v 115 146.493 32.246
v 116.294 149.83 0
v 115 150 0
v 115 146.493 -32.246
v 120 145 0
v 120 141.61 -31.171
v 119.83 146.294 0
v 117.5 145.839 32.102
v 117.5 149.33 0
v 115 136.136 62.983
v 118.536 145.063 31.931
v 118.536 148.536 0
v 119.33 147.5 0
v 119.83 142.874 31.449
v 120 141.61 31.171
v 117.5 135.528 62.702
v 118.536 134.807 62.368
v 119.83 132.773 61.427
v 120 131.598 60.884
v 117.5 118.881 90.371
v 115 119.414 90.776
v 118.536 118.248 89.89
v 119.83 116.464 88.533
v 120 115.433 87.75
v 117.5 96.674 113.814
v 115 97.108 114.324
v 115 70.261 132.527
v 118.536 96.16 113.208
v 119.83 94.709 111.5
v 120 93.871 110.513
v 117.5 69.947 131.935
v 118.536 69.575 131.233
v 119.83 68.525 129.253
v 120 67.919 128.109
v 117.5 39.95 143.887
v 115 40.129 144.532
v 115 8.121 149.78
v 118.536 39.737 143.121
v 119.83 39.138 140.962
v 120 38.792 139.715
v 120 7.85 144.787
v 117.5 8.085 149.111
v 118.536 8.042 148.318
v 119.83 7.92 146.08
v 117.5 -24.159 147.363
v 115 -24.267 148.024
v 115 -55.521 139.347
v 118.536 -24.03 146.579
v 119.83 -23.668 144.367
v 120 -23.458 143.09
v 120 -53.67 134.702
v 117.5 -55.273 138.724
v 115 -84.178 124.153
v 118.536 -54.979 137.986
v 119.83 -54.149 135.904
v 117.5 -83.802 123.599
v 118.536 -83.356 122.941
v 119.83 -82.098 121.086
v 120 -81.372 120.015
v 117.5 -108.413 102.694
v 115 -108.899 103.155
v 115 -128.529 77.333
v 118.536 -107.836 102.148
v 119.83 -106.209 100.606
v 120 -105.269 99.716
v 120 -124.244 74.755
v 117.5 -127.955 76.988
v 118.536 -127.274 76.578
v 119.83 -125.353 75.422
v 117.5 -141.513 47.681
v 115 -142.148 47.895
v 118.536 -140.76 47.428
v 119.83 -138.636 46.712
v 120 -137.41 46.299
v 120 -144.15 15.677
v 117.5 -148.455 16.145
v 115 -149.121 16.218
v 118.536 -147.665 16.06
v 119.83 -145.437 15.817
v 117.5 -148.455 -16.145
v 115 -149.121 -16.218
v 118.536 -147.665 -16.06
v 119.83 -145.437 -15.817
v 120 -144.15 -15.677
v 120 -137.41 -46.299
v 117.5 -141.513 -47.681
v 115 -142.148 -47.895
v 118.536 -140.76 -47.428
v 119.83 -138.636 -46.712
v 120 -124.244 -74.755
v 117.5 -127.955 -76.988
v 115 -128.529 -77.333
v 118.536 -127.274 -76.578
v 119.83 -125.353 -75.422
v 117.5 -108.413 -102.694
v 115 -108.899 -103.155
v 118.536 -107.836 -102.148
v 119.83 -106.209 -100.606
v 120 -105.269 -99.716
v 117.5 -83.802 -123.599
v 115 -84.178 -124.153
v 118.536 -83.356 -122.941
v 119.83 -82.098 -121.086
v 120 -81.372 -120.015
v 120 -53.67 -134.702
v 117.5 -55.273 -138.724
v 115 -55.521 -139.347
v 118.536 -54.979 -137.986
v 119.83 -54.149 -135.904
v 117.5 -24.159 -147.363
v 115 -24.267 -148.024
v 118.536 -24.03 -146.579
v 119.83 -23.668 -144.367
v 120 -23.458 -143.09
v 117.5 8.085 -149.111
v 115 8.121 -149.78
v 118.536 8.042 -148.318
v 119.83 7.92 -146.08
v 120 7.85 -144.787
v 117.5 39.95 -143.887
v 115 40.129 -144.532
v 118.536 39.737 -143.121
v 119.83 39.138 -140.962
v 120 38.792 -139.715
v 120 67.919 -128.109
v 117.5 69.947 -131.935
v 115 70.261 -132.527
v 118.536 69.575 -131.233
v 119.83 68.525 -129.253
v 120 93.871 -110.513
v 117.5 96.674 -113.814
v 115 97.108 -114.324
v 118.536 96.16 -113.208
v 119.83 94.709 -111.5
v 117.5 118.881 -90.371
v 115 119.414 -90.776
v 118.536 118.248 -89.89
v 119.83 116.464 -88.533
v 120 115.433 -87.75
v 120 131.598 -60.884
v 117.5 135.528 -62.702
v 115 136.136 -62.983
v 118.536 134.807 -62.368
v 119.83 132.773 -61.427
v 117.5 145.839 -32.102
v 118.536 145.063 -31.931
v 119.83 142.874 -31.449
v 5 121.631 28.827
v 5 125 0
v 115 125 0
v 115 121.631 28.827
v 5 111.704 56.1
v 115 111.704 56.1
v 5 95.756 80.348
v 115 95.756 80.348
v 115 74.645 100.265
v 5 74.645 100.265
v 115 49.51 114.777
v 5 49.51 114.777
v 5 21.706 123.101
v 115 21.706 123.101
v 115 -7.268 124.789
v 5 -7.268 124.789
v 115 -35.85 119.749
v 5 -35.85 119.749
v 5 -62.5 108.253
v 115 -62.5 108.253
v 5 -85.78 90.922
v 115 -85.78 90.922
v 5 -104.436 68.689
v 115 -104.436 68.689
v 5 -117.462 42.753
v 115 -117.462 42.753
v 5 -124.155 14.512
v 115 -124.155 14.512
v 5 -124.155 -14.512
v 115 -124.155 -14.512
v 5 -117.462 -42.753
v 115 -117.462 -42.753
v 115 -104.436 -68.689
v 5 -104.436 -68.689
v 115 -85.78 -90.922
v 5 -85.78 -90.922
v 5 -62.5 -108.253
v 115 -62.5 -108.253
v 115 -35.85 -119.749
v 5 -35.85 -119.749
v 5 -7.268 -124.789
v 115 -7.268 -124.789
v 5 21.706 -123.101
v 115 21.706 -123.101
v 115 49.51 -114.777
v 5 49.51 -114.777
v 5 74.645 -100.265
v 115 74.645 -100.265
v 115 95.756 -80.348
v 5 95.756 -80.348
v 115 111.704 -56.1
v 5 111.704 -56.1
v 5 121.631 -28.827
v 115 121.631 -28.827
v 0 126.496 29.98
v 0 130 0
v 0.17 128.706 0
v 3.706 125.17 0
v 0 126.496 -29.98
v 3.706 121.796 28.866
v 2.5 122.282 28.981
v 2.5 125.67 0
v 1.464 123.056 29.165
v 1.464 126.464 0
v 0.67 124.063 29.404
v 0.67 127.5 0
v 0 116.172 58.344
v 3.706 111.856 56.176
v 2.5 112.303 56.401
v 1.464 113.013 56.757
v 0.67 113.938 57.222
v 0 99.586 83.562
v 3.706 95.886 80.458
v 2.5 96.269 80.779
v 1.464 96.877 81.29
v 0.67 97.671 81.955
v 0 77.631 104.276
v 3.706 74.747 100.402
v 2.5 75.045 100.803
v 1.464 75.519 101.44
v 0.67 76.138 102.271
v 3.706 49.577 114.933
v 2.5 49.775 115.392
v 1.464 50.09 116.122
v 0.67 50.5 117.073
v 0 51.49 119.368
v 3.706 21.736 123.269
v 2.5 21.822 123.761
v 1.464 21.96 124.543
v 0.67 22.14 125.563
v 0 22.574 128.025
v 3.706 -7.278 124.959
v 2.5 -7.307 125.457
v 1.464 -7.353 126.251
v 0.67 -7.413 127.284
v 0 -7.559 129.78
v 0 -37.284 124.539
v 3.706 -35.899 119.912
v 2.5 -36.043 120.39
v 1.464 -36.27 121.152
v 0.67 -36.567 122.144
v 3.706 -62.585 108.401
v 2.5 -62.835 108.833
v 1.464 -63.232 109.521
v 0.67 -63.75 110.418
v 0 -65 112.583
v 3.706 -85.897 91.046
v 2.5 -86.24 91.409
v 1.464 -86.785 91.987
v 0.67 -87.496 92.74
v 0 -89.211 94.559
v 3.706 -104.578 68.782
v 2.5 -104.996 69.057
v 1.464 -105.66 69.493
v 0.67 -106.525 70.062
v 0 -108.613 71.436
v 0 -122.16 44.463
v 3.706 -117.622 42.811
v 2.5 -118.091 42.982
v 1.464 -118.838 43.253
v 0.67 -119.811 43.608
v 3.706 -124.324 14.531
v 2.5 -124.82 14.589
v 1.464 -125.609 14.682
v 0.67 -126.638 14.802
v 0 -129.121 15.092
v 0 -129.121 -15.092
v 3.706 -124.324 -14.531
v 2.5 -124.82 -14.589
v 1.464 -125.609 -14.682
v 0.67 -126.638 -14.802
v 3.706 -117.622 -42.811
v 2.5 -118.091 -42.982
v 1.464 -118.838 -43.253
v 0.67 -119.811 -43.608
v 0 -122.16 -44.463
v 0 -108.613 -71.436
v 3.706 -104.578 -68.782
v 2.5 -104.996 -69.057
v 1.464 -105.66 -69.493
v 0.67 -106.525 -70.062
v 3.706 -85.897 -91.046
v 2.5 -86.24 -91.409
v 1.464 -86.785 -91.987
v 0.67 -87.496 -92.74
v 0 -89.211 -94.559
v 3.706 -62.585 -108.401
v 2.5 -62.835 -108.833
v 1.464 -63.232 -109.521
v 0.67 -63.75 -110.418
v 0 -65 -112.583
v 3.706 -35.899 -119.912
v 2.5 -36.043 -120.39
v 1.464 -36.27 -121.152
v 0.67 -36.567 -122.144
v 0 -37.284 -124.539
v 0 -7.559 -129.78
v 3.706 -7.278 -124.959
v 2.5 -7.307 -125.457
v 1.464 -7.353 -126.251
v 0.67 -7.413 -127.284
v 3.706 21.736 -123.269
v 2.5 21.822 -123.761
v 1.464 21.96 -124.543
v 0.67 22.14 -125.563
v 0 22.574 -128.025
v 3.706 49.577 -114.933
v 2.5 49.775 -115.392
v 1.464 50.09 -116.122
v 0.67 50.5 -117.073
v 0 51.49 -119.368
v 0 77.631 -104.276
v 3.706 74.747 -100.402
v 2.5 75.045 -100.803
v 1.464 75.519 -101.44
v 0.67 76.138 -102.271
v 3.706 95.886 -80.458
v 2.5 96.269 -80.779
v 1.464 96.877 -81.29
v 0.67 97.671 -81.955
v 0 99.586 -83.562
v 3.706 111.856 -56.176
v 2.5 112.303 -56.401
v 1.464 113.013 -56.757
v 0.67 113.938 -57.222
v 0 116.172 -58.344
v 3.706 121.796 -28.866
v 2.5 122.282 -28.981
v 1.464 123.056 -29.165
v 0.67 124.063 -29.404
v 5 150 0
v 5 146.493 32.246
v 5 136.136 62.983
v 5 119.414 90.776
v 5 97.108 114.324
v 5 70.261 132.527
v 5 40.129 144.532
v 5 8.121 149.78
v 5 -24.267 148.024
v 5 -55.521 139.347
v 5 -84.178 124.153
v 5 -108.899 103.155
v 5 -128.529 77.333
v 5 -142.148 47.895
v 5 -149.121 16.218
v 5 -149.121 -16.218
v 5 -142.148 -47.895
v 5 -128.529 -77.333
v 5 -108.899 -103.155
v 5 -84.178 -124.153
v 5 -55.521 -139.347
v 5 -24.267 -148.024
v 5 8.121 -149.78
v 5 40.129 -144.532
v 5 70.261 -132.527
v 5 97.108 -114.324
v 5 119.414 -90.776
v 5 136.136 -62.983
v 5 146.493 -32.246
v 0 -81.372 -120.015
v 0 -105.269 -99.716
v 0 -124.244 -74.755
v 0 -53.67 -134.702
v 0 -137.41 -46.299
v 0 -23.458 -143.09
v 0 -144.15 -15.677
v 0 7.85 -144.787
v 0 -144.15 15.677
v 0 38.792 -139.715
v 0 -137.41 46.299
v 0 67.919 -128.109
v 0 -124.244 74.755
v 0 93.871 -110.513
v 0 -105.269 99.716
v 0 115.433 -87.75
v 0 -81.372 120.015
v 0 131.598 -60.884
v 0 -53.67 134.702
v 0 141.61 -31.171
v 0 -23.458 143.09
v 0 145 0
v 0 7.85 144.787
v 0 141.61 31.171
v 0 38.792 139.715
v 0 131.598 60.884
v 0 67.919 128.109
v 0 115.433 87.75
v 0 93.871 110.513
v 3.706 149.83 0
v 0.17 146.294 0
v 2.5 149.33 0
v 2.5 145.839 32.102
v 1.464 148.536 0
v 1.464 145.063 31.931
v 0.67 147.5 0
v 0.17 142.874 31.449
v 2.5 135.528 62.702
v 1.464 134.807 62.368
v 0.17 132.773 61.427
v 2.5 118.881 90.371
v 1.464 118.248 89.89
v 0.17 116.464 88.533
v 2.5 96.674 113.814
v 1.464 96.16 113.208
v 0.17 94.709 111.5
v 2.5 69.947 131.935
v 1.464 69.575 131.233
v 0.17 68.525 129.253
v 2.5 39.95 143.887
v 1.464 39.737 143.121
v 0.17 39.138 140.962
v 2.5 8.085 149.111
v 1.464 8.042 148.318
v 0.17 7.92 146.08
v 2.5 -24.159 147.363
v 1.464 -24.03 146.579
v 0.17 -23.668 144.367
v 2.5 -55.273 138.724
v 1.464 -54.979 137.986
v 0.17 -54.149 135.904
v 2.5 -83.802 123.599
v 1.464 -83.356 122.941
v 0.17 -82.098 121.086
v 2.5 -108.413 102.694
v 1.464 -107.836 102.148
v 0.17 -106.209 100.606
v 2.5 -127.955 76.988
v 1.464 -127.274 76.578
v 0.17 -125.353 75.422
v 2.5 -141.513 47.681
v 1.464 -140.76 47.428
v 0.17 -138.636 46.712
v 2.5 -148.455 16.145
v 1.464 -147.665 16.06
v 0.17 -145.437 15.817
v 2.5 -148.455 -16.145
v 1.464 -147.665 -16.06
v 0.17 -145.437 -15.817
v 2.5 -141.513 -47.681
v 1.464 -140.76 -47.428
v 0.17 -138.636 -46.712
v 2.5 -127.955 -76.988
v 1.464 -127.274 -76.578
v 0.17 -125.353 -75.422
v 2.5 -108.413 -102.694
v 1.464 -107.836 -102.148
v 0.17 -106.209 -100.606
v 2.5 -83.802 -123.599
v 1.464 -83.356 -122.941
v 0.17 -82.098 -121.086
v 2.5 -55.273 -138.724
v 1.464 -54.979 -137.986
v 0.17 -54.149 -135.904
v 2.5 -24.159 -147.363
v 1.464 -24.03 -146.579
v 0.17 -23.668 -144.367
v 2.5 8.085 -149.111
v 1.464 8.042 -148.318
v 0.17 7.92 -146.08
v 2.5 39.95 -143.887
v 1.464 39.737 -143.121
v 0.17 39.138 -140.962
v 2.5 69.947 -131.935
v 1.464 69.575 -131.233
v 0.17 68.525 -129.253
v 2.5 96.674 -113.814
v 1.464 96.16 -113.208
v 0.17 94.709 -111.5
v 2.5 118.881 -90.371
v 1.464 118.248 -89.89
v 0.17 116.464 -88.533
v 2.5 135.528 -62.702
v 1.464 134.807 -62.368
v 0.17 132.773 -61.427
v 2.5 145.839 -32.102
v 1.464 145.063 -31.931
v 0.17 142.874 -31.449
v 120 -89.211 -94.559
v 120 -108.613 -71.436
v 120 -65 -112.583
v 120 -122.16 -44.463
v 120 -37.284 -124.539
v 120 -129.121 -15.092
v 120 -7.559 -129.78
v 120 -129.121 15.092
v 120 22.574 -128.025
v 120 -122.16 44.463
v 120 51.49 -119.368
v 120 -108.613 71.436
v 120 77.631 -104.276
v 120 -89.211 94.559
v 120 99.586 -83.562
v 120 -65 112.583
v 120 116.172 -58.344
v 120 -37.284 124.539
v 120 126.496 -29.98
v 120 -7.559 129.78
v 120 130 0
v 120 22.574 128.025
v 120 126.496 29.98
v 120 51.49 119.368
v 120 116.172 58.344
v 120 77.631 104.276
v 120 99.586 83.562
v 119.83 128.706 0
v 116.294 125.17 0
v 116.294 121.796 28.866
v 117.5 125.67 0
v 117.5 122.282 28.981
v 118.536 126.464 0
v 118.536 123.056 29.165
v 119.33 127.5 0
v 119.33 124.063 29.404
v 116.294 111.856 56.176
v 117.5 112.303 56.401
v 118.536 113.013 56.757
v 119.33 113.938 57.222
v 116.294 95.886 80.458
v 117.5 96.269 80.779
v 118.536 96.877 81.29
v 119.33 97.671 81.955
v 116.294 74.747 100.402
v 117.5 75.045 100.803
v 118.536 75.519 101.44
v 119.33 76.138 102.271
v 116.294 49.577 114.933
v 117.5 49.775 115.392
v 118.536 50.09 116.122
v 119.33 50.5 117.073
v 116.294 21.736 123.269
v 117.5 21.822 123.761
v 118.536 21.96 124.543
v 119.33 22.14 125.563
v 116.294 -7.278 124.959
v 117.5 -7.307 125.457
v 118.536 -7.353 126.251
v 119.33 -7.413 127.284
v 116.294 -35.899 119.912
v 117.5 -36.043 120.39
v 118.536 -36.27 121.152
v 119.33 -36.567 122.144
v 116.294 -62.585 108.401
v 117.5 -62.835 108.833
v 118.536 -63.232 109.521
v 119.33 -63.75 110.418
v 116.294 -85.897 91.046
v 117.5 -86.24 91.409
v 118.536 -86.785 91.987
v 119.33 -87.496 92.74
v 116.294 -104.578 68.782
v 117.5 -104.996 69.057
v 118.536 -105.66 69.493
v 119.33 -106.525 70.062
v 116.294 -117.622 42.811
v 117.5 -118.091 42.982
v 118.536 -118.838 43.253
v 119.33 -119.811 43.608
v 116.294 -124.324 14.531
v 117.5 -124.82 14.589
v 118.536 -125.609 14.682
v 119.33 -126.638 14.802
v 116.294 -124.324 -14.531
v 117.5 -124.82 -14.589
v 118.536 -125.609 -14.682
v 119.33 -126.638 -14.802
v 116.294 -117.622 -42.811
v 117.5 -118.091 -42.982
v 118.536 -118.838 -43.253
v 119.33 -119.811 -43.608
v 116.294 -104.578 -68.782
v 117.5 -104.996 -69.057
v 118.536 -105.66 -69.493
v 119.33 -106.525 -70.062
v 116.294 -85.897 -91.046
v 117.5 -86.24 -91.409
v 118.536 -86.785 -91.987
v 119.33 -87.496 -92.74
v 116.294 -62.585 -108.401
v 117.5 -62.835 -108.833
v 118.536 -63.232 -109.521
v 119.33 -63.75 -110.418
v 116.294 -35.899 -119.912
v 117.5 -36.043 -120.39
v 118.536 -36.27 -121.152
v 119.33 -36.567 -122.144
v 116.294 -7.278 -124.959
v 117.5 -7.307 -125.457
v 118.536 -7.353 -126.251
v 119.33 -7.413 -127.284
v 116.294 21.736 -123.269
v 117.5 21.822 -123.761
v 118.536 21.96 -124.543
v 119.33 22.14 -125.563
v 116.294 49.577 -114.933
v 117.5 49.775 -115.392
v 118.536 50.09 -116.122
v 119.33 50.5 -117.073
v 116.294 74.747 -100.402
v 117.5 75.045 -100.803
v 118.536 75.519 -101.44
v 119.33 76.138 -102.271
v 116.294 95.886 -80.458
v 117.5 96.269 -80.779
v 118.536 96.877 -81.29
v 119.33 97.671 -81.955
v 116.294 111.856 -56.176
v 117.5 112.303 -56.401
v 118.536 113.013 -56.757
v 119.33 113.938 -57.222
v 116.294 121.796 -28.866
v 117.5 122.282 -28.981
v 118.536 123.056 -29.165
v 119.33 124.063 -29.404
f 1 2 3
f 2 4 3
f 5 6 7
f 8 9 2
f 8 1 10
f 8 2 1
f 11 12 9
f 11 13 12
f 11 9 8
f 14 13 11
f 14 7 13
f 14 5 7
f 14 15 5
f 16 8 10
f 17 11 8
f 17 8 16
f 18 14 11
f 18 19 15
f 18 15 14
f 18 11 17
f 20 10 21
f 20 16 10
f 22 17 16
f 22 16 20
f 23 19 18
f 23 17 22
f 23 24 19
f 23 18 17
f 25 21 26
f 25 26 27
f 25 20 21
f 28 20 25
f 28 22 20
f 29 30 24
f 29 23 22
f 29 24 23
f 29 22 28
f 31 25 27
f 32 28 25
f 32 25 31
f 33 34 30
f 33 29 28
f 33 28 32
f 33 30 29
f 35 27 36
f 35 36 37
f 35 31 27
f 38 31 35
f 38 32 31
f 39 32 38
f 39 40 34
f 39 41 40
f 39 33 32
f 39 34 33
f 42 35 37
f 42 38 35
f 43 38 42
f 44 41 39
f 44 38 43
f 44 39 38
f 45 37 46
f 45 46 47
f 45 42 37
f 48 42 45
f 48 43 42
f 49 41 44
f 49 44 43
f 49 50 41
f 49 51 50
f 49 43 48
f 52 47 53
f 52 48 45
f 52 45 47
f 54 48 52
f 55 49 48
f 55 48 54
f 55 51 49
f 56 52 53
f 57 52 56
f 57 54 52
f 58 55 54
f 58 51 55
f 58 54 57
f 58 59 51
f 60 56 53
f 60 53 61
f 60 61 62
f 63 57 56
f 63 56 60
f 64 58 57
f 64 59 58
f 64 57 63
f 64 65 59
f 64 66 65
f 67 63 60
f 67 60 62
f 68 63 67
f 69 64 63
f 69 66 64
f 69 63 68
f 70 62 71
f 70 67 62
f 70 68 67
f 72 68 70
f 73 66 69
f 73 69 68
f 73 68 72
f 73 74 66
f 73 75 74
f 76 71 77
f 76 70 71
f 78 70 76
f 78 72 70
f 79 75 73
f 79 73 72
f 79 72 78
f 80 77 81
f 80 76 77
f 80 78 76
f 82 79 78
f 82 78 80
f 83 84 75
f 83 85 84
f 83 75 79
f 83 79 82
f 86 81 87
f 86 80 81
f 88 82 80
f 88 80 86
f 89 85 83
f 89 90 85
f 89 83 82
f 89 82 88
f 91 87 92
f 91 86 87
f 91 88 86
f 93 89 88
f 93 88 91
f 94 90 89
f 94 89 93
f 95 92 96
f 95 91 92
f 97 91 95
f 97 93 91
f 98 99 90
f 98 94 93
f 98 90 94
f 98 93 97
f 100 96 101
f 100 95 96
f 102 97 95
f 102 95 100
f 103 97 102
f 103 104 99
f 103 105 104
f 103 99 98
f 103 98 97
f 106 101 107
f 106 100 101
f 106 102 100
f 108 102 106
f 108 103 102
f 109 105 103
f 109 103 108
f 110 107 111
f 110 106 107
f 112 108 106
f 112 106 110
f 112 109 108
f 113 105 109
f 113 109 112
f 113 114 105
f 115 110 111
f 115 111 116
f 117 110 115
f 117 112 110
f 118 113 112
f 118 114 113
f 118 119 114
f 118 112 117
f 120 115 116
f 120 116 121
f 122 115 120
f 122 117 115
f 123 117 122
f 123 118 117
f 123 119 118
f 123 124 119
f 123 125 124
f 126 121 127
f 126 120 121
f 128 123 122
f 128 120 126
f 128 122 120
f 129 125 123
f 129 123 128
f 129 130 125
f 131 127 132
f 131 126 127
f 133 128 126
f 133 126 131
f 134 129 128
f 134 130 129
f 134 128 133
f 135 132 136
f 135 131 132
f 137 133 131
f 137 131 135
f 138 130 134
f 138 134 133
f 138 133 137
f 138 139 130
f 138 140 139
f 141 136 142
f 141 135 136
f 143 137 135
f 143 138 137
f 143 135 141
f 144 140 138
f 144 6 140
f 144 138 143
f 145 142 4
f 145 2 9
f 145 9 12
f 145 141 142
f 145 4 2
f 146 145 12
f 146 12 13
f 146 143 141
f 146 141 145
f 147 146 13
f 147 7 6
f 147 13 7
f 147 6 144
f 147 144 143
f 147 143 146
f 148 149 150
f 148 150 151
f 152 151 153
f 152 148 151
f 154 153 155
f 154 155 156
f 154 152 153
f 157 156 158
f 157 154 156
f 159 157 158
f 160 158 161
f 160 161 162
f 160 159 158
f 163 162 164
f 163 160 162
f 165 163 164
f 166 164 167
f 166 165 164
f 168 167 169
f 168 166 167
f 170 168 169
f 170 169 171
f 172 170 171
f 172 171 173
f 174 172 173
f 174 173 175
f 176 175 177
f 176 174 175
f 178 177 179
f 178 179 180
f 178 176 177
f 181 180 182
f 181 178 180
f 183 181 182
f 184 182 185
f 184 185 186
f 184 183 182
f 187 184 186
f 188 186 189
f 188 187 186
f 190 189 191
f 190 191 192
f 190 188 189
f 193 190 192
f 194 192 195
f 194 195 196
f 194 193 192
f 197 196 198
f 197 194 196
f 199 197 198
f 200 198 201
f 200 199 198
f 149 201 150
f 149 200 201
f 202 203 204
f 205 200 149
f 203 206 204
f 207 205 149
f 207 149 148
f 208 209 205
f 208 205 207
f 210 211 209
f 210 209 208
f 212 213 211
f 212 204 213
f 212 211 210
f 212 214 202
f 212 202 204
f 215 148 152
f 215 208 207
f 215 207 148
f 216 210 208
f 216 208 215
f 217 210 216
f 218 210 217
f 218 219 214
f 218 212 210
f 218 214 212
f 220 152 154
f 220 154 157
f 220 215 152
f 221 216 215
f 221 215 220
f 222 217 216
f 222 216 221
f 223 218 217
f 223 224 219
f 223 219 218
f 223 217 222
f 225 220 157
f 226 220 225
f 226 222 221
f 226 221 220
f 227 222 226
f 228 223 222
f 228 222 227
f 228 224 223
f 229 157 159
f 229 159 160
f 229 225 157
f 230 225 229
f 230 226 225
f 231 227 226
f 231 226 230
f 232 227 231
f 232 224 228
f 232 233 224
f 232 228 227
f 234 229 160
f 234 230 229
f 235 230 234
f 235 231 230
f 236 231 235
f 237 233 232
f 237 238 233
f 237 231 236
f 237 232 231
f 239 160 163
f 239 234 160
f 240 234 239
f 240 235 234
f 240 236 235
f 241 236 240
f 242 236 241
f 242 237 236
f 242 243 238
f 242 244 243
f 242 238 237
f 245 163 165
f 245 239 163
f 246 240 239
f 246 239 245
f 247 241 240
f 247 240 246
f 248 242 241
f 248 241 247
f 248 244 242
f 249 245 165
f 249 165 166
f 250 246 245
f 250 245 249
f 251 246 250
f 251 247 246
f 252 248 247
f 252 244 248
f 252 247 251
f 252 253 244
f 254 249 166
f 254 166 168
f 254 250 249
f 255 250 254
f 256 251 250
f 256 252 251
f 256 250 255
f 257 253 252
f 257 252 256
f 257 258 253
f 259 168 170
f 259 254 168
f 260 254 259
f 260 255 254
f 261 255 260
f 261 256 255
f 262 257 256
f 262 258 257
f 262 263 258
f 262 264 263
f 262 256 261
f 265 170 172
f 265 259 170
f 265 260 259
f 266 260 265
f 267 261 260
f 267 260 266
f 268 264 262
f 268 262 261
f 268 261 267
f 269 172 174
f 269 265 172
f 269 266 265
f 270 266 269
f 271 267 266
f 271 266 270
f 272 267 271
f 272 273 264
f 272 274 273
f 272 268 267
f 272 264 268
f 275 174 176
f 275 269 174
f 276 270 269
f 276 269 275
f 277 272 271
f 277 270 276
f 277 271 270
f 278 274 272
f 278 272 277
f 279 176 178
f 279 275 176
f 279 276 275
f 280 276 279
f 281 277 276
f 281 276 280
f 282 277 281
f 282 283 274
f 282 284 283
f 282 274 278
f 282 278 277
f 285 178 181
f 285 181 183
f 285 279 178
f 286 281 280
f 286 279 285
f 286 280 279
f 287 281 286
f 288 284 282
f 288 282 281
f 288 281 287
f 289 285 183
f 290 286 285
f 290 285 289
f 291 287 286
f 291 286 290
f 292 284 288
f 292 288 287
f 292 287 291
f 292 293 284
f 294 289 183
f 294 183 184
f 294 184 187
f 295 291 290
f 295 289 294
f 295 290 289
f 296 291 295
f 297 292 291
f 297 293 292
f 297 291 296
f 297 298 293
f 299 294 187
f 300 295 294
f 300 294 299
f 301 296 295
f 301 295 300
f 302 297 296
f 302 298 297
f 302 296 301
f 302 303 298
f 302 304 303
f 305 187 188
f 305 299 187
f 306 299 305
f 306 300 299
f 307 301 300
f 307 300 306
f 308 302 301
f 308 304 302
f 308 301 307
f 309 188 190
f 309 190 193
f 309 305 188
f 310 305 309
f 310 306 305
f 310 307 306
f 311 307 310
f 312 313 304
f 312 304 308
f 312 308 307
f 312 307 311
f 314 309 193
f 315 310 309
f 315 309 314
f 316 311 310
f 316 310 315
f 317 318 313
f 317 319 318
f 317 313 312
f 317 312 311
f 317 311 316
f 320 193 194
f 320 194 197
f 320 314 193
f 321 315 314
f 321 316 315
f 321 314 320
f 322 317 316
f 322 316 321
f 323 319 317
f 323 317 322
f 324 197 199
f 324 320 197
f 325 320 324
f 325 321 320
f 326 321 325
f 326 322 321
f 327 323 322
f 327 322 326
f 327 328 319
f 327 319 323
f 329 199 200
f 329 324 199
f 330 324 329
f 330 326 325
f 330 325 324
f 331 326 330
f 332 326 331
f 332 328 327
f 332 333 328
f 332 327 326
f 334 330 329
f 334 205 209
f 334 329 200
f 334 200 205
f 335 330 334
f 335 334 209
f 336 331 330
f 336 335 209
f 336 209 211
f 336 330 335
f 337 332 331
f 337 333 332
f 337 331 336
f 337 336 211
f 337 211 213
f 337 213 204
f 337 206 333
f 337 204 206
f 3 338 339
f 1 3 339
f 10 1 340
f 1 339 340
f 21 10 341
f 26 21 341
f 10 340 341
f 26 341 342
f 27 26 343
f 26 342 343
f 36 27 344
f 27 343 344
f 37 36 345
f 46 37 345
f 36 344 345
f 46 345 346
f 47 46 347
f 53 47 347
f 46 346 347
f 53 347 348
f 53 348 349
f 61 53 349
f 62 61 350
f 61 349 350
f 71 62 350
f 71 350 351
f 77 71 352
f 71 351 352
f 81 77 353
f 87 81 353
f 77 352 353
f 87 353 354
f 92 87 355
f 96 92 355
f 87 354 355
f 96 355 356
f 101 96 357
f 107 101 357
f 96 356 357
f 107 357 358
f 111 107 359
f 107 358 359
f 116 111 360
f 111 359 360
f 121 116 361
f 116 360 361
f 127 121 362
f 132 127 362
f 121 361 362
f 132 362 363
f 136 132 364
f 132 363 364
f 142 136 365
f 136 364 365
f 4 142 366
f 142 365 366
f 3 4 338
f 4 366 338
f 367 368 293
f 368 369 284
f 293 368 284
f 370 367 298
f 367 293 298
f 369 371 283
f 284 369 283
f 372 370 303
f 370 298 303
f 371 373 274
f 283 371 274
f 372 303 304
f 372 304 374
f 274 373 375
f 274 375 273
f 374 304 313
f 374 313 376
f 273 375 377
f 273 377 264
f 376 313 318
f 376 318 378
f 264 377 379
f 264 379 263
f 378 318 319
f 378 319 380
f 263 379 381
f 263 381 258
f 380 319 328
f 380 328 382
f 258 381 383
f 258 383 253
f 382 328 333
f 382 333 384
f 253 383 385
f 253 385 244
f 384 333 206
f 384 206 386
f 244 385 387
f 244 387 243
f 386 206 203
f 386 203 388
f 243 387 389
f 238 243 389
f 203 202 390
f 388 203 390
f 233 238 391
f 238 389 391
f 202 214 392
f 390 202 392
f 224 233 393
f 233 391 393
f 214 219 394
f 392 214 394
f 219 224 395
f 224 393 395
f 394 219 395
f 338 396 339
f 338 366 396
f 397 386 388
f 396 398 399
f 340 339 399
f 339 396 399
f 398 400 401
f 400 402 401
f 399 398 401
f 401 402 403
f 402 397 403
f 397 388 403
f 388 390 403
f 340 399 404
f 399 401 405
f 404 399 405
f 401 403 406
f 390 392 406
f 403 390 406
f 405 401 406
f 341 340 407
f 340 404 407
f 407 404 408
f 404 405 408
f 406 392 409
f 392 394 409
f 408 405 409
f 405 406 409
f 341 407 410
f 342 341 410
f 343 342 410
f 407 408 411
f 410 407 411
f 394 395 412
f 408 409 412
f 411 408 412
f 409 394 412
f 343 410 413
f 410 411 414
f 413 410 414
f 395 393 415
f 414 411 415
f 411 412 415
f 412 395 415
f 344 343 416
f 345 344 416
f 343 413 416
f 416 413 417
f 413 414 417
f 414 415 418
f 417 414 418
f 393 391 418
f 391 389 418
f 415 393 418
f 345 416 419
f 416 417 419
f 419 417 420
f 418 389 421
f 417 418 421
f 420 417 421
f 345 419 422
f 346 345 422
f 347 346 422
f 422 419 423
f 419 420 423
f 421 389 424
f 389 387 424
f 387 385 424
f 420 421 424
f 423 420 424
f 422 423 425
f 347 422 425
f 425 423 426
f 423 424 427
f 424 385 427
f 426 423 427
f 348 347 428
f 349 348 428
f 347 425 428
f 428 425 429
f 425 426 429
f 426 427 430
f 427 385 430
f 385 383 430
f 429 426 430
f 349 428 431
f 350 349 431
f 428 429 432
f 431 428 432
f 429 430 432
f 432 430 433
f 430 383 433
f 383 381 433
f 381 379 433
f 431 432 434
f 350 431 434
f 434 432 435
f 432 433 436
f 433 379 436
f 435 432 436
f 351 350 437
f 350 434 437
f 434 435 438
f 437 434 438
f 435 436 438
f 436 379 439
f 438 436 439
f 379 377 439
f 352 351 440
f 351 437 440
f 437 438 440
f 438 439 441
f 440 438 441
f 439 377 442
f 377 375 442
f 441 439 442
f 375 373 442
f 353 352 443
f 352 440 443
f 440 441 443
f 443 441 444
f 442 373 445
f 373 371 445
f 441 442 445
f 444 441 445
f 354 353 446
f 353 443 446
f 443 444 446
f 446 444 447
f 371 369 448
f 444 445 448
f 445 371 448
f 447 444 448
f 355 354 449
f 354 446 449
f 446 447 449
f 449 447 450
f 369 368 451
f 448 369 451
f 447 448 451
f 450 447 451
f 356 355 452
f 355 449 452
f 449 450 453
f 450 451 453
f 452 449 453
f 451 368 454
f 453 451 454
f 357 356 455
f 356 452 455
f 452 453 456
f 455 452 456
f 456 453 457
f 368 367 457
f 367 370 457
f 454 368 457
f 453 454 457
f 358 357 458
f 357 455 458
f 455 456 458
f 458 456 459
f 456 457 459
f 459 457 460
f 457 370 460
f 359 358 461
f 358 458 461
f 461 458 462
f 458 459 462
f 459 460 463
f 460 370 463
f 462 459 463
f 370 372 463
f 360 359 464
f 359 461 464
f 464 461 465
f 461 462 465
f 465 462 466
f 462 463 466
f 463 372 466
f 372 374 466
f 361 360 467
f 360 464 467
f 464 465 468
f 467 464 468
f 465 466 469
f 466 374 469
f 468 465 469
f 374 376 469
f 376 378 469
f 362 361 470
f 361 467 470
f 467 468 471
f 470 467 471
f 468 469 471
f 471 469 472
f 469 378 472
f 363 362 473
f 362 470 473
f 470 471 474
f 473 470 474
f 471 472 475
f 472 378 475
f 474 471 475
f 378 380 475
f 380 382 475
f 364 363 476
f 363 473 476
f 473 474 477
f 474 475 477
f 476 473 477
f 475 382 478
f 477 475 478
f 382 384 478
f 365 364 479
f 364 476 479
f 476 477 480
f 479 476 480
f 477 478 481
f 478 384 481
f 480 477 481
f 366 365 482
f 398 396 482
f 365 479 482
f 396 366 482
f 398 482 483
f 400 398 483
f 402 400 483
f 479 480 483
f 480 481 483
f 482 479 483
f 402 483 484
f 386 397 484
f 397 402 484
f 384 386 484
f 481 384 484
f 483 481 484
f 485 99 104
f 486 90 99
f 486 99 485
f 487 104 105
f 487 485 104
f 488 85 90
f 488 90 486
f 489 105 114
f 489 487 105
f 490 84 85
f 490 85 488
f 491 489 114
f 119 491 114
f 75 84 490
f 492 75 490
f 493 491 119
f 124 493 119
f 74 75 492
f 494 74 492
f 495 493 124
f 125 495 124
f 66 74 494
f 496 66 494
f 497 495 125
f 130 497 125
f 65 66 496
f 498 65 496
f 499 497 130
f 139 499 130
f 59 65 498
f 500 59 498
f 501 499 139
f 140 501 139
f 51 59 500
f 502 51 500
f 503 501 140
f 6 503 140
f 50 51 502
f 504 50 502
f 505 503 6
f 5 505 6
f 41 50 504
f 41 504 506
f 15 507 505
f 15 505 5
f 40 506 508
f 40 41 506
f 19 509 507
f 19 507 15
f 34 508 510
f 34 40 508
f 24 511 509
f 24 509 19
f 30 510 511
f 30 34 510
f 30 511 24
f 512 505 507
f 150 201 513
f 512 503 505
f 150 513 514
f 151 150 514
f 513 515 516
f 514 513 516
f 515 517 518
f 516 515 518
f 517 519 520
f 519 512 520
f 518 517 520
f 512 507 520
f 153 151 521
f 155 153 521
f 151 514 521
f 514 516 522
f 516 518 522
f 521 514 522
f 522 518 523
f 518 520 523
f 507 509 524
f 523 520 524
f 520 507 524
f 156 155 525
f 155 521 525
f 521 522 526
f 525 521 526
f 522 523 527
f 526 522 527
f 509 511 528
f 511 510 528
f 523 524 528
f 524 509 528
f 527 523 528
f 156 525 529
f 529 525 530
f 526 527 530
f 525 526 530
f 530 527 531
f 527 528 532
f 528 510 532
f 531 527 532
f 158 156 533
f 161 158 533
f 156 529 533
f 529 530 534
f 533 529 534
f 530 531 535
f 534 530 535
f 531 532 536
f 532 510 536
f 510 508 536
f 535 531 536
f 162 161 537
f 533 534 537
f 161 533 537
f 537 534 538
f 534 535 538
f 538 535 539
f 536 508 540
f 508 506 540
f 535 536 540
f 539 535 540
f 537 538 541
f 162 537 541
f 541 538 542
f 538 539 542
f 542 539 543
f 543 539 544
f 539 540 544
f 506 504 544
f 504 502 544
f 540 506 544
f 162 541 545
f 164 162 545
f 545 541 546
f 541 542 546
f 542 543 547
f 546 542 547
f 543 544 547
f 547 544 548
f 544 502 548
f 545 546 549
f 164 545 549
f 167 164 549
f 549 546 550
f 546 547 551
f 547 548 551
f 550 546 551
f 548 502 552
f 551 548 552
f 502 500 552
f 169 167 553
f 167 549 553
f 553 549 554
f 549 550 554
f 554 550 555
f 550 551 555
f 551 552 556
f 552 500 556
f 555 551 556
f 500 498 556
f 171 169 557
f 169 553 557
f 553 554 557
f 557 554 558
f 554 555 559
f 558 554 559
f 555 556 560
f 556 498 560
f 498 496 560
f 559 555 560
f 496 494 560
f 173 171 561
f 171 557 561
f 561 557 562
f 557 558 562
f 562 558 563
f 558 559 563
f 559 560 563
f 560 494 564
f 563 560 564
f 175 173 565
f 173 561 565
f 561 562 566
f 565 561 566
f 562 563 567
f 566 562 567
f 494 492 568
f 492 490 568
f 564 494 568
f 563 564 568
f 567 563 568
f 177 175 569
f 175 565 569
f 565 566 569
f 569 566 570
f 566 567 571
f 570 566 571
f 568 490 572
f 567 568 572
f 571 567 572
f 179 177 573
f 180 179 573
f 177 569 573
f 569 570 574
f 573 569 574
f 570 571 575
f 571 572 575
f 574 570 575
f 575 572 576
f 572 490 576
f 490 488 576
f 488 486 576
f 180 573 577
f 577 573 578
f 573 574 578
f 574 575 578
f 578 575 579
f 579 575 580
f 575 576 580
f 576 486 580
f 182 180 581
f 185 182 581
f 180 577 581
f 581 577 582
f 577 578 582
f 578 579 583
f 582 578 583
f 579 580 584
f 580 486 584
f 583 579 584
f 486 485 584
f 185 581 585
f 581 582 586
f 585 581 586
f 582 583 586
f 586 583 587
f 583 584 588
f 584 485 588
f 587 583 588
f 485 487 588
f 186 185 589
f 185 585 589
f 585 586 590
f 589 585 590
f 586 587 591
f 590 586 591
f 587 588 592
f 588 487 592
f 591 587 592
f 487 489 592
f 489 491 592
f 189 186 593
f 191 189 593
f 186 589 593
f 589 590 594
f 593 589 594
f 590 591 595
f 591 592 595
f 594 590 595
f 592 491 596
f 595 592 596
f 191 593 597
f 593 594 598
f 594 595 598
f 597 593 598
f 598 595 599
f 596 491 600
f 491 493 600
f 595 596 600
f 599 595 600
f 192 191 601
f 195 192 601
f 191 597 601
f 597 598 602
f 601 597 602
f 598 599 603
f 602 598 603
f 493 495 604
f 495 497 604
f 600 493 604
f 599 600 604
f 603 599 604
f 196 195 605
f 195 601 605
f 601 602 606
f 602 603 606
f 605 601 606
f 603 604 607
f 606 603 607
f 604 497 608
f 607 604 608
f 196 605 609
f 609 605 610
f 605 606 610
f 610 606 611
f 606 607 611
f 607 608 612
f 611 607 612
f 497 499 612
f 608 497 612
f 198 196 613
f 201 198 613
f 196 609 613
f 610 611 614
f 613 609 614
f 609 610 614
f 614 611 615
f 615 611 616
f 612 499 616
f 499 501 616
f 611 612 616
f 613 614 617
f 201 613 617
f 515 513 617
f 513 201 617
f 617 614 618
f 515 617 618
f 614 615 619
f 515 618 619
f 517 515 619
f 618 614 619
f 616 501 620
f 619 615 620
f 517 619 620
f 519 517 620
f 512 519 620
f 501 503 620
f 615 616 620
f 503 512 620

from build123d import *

# Parameters (mm, degrees)
F0_R     = 150
F0_R_2   = 125
F1_DEPTH = 120
F2_R     = 5


with BuildPart() as f1:
    # F0 (on Right) → F1 (new body)
    with BuildSketch(Plane.YZ):
        Circle(F0_R)
        Circle(F0_R_2, mode=Mode.SUBTRACT)
    extrude(amount=F1_DEPTH)

    # F2
    f2_edges = [f1.edges().sort_by_distance(p)[0] for p in [
        (120, -125, 0),
        (120, -150, 0),
        (0, -150, 0),
        (0, -125, 0),
    ]]
    fillet(f2_edges, radius=F2_R)


solid = f1.part
